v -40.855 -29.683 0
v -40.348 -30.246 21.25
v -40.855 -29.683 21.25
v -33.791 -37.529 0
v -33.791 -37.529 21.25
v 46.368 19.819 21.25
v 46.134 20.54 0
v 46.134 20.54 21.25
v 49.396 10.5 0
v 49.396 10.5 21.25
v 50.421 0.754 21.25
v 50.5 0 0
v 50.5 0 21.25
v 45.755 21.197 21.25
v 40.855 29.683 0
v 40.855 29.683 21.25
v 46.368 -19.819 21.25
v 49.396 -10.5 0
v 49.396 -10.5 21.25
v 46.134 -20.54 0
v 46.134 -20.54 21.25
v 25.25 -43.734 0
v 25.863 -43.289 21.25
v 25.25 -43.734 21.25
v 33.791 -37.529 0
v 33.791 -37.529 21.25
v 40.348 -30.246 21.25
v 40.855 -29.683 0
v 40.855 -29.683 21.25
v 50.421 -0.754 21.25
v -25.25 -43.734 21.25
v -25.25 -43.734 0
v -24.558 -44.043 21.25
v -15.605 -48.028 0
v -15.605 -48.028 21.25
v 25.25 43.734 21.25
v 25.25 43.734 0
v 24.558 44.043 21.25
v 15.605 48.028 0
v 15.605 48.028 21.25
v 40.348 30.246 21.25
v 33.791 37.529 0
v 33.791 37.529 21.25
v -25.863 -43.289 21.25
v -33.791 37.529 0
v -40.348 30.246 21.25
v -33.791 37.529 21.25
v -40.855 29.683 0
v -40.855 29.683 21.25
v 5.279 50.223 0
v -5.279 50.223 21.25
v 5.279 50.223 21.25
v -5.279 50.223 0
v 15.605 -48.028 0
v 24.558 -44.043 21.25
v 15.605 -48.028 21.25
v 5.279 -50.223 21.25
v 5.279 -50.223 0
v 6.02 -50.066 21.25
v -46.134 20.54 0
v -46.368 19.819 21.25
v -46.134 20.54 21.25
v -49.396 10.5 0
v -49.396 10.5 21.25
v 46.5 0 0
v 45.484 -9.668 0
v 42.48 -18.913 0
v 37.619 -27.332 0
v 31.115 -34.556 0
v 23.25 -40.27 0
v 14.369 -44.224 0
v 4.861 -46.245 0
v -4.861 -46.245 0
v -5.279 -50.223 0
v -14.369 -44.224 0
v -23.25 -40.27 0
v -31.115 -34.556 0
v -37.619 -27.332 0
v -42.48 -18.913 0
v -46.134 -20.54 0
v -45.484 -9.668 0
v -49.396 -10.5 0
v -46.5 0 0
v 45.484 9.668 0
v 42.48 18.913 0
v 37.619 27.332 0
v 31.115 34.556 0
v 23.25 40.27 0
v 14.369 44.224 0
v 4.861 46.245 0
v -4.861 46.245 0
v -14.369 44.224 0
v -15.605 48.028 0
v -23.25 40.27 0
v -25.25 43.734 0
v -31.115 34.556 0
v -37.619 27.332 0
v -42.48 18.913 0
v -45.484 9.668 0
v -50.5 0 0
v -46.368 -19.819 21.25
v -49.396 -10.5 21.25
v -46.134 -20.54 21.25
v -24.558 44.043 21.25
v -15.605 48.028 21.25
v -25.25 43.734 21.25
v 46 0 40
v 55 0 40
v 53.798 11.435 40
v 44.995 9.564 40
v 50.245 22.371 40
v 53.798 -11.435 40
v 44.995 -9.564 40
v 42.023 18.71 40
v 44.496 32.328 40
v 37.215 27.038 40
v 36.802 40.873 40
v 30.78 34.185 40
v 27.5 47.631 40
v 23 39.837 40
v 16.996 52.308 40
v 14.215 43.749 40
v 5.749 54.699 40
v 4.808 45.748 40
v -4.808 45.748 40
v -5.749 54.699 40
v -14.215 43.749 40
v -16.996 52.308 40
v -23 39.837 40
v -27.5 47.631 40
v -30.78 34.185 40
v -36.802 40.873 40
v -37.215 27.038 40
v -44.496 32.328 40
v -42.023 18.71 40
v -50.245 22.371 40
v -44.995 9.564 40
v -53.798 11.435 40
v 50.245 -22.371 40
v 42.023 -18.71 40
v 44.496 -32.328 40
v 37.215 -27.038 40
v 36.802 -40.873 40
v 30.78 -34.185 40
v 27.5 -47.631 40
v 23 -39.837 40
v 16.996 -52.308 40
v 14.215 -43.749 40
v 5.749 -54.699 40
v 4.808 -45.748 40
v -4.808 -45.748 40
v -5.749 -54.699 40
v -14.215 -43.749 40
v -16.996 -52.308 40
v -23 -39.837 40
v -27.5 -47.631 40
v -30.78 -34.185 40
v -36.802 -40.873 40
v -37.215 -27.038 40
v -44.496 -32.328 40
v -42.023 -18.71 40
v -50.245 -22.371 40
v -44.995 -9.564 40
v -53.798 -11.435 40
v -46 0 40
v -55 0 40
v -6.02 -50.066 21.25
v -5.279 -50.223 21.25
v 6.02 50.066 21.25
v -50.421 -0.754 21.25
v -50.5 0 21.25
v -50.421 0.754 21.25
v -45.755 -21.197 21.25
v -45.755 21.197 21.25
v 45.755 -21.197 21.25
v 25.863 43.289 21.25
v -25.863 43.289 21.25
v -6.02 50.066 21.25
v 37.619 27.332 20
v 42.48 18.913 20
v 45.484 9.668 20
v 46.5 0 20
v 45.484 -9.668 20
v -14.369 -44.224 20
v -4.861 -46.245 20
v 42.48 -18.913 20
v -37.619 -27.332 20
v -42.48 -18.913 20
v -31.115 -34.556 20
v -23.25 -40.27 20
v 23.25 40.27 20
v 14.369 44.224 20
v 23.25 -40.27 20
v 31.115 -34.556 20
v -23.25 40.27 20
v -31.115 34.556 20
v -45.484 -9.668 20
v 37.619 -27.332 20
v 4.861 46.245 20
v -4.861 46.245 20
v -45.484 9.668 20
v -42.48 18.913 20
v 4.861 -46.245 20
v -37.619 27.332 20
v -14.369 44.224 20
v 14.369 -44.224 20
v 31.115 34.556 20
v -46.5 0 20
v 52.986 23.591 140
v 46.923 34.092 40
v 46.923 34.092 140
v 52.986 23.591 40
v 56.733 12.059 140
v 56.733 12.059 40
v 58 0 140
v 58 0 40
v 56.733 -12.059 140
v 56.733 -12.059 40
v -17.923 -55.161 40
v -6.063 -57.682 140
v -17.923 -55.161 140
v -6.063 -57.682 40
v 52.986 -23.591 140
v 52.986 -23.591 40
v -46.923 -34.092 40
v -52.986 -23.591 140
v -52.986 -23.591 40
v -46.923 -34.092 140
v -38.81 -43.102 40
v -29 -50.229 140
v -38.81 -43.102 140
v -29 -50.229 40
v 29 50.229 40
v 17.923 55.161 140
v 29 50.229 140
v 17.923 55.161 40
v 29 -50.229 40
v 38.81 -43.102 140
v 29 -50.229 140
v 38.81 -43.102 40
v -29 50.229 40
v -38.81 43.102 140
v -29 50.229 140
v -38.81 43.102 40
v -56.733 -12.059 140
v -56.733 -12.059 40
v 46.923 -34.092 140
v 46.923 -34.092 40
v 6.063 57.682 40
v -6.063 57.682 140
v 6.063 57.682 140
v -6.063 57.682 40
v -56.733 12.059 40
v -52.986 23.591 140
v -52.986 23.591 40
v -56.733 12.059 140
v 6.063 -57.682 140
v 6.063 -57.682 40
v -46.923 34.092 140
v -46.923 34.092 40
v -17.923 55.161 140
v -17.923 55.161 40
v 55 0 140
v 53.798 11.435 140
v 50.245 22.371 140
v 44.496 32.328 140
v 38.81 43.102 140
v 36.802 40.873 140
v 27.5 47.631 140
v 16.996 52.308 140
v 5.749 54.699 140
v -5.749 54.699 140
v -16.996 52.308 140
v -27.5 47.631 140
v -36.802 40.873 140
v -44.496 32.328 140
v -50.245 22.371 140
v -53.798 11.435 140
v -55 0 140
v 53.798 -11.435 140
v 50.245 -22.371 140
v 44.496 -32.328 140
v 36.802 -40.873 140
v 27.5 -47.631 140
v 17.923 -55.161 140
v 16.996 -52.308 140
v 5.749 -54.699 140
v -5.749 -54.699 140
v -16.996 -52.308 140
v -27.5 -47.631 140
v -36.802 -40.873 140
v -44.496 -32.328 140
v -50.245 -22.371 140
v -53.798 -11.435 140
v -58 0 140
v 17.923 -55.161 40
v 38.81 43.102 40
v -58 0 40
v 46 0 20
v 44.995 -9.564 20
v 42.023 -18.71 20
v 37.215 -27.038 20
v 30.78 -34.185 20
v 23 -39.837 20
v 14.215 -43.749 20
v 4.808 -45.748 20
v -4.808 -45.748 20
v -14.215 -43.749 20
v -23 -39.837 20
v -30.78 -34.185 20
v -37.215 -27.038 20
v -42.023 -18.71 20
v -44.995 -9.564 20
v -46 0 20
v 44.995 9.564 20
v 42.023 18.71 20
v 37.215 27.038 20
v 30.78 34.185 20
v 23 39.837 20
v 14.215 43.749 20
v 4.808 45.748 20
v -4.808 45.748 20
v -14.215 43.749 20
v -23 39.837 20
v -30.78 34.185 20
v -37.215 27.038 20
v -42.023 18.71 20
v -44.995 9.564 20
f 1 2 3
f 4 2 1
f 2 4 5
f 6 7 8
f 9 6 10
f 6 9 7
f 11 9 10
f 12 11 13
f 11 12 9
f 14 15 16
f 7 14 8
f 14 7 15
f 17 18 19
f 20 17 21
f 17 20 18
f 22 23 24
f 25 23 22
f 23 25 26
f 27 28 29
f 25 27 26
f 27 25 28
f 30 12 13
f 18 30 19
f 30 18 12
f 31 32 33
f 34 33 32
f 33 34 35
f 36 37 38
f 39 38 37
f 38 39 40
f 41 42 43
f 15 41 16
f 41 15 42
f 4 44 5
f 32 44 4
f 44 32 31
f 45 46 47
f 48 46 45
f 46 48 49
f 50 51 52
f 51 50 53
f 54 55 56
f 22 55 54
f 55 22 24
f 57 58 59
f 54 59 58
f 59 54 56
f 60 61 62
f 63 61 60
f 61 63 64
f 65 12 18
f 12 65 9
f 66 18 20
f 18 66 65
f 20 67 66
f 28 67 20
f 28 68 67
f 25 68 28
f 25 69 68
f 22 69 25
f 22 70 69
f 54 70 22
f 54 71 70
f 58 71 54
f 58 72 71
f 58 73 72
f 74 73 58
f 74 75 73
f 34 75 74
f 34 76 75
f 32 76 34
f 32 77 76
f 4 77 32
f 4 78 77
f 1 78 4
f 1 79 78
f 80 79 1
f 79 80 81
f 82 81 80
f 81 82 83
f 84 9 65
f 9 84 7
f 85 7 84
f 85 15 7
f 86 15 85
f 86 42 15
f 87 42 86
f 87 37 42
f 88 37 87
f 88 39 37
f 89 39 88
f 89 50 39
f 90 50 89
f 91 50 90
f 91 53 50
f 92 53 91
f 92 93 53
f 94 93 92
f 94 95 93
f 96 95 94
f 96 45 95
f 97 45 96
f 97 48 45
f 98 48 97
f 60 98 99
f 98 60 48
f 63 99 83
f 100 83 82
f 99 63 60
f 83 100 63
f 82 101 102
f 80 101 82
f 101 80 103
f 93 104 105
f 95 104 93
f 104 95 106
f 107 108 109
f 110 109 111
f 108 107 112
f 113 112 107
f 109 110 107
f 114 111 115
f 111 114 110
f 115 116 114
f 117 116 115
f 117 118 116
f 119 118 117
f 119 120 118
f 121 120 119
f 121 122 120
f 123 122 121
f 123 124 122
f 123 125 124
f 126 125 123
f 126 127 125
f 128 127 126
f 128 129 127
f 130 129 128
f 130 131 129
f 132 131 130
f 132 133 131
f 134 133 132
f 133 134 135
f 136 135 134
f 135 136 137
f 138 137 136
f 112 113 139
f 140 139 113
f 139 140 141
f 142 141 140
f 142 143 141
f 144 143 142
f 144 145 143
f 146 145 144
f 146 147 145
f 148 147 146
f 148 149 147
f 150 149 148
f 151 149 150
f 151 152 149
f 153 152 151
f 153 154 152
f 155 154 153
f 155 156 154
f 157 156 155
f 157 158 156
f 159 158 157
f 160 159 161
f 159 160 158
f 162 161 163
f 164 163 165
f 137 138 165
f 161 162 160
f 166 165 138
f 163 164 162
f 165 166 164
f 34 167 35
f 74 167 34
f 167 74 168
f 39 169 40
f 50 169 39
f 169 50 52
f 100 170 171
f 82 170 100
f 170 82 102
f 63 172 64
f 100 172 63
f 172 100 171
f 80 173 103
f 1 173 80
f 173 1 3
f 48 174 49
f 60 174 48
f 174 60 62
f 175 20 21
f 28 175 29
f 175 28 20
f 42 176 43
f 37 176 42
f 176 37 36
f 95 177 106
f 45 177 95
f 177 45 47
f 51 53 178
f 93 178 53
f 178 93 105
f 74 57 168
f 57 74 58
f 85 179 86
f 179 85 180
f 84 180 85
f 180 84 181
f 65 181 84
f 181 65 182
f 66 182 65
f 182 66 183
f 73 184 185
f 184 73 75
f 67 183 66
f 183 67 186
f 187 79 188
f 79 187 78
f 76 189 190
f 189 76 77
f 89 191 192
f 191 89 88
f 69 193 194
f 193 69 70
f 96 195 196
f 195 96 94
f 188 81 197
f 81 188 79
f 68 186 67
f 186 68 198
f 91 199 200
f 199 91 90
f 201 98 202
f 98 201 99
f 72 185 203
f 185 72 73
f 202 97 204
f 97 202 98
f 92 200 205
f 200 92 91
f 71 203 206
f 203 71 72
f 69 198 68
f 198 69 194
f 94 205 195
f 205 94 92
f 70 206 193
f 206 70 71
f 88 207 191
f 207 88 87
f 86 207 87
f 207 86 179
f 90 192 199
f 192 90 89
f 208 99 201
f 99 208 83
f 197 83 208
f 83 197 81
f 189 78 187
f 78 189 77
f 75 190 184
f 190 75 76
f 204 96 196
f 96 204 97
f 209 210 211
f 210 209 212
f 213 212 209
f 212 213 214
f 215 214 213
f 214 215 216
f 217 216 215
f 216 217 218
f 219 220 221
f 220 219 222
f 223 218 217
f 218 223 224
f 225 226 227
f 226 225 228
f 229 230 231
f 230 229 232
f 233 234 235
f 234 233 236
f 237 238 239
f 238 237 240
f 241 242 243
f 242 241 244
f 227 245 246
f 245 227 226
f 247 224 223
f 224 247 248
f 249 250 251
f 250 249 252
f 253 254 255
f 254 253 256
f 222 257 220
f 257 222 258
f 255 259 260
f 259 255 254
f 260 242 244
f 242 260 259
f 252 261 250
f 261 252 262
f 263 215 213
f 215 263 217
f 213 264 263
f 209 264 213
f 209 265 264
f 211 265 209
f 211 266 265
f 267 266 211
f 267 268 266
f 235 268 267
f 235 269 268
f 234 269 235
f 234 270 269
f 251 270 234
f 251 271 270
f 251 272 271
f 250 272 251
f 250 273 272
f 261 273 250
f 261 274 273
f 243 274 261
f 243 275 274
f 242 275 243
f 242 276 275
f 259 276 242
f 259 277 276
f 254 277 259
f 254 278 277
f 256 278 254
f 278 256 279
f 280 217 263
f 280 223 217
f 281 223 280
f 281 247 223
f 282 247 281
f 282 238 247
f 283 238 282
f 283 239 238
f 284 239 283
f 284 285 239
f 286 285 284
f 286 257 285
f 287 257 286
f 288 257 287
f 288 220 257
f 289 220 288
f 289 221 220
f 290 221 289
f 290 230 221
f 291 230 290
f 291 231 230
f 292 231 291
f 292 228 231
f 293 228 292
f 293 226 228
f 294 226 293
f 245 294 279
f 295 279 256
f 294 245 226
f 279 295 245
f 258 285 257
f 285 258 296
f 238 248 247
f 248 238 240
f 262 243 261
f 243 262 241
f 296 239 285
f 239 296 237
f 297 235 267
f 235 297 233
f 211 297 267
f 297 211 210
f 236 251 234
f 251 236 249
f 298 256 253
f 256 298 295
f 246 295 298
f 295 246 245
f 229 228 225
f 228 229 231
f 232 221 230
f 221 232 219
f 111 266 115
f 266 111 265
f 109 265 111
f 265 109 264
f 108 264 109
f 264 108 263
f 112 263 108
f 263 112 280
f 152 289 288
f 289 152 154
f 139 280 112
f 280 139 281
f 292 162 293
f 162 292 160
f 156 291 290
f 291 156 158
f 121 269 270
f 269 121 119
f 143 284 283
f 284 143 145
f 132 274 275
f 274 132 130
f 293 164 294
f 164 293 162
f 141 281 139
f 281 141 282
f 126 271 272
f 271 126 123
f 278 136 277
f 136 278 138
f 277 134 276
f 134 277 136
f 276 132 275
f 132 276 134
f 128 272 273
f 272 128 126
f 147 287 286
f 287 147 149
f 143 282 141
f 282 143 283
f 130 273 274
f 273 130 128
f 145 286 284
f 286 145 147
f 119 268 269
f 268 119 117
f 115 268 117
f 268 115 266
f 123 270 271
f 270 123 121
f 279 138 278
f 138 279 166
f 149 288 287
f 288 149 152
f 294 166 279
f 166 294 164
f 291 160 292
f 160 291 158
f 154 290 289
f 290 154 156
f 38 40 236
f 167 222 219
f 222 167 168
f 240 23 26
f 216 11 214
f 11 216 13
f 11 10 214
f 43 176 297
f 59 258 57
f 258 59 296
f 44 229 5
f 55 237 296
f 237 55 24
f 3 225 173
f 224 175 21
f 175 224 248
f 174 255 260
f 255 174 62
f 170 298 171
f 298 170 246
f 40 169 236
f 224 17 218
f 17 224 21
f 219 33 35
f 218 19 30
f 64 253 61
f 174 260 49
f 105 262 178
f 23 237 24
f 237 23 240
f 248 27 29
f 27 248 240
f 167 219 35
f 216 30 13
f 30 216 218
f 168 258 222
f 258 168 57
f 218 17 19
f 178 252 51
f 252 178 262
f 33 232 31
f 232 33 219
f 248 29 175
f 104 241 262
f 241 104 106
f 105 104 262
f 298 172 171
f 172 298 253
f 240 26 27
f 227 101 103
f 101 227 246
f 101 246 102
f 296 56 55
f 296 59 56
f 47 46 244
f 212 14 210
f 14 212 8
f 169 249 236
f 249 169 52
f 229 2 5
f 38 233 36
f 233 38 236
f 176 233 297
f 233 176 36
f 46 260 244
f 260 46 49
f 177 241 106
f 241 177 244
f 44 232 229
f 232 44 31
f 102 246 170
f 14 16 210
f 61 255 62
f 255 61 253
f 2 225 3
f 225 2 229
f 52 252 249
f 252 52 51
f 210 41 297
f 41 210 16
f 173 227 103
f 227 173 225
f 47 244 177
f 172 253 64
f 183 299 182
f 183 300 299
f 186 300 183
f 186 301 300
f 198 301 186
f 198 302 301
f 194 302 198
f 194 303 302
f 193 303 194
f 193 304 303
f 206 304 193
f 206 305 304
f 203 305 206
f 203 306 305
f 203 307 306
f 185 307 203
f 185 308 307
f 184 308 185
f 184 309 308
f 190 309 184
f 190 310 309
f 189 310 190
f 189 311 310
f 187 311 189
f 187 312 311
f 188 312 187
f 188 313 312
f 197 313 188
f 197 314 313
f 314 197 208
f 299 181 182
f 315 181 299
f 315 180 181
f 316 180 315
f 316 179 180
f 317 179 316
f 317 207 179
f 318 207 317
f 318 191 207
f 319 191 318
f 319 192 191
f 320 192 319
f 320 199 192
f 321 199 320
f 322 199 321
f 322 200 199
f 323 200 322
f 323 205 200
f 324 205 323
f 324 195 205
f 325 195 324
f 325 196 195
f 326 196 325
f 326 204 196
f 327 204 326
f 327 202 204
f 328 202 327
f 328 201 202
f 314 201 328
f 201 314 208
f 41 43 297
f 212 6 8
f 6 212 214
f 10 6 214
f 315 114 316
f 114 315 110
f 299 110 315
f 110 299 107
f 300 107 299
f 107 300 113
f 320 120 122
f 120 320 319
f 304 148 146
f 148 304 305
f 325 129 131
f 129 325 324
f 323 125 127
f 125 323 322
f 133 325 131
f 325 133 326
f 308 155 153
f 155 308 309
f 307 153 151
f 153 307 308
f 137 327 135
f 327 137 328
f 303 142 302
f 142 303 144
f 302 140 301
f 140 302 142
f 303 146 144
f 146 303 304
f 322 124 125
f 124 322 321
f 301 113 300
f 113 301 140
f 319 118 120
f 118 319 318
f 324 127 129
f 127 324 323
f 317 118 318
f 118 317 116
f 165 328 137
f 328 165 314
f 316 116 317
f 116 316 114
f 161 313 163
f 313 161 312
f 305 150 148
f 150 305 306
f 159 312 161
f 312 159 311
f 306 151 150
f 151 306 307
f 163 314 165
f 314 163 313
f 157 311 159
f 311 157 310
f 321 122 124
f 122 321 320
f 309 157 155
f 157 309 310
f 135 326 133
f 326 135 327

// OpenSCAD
//h = 115;

union() {
	h1 = 40;
	difference() {
		cylinder( r=101/2, h=h1 );
		translate([0,0,-1])
		cylinder( r=101/2-4, h=h1+2 );
	}

	h2 = 100;
	translate([0,0,h1])
	difference() {
		cylinder( r=108/2+4, h=h2 );
		translate([0,0,-1])
		cylinder( r=110/2, h=h2+2 );
	}

	h3 = 20;
	translate([0,0,h1-h3])
	difference() {
		cylinder( r2=108/2+4, r1=108/2-4, h=h3 );
		translate([0,0,-1])
		cylinder( r=108/2-8, h=h2+2 );
	}
}
